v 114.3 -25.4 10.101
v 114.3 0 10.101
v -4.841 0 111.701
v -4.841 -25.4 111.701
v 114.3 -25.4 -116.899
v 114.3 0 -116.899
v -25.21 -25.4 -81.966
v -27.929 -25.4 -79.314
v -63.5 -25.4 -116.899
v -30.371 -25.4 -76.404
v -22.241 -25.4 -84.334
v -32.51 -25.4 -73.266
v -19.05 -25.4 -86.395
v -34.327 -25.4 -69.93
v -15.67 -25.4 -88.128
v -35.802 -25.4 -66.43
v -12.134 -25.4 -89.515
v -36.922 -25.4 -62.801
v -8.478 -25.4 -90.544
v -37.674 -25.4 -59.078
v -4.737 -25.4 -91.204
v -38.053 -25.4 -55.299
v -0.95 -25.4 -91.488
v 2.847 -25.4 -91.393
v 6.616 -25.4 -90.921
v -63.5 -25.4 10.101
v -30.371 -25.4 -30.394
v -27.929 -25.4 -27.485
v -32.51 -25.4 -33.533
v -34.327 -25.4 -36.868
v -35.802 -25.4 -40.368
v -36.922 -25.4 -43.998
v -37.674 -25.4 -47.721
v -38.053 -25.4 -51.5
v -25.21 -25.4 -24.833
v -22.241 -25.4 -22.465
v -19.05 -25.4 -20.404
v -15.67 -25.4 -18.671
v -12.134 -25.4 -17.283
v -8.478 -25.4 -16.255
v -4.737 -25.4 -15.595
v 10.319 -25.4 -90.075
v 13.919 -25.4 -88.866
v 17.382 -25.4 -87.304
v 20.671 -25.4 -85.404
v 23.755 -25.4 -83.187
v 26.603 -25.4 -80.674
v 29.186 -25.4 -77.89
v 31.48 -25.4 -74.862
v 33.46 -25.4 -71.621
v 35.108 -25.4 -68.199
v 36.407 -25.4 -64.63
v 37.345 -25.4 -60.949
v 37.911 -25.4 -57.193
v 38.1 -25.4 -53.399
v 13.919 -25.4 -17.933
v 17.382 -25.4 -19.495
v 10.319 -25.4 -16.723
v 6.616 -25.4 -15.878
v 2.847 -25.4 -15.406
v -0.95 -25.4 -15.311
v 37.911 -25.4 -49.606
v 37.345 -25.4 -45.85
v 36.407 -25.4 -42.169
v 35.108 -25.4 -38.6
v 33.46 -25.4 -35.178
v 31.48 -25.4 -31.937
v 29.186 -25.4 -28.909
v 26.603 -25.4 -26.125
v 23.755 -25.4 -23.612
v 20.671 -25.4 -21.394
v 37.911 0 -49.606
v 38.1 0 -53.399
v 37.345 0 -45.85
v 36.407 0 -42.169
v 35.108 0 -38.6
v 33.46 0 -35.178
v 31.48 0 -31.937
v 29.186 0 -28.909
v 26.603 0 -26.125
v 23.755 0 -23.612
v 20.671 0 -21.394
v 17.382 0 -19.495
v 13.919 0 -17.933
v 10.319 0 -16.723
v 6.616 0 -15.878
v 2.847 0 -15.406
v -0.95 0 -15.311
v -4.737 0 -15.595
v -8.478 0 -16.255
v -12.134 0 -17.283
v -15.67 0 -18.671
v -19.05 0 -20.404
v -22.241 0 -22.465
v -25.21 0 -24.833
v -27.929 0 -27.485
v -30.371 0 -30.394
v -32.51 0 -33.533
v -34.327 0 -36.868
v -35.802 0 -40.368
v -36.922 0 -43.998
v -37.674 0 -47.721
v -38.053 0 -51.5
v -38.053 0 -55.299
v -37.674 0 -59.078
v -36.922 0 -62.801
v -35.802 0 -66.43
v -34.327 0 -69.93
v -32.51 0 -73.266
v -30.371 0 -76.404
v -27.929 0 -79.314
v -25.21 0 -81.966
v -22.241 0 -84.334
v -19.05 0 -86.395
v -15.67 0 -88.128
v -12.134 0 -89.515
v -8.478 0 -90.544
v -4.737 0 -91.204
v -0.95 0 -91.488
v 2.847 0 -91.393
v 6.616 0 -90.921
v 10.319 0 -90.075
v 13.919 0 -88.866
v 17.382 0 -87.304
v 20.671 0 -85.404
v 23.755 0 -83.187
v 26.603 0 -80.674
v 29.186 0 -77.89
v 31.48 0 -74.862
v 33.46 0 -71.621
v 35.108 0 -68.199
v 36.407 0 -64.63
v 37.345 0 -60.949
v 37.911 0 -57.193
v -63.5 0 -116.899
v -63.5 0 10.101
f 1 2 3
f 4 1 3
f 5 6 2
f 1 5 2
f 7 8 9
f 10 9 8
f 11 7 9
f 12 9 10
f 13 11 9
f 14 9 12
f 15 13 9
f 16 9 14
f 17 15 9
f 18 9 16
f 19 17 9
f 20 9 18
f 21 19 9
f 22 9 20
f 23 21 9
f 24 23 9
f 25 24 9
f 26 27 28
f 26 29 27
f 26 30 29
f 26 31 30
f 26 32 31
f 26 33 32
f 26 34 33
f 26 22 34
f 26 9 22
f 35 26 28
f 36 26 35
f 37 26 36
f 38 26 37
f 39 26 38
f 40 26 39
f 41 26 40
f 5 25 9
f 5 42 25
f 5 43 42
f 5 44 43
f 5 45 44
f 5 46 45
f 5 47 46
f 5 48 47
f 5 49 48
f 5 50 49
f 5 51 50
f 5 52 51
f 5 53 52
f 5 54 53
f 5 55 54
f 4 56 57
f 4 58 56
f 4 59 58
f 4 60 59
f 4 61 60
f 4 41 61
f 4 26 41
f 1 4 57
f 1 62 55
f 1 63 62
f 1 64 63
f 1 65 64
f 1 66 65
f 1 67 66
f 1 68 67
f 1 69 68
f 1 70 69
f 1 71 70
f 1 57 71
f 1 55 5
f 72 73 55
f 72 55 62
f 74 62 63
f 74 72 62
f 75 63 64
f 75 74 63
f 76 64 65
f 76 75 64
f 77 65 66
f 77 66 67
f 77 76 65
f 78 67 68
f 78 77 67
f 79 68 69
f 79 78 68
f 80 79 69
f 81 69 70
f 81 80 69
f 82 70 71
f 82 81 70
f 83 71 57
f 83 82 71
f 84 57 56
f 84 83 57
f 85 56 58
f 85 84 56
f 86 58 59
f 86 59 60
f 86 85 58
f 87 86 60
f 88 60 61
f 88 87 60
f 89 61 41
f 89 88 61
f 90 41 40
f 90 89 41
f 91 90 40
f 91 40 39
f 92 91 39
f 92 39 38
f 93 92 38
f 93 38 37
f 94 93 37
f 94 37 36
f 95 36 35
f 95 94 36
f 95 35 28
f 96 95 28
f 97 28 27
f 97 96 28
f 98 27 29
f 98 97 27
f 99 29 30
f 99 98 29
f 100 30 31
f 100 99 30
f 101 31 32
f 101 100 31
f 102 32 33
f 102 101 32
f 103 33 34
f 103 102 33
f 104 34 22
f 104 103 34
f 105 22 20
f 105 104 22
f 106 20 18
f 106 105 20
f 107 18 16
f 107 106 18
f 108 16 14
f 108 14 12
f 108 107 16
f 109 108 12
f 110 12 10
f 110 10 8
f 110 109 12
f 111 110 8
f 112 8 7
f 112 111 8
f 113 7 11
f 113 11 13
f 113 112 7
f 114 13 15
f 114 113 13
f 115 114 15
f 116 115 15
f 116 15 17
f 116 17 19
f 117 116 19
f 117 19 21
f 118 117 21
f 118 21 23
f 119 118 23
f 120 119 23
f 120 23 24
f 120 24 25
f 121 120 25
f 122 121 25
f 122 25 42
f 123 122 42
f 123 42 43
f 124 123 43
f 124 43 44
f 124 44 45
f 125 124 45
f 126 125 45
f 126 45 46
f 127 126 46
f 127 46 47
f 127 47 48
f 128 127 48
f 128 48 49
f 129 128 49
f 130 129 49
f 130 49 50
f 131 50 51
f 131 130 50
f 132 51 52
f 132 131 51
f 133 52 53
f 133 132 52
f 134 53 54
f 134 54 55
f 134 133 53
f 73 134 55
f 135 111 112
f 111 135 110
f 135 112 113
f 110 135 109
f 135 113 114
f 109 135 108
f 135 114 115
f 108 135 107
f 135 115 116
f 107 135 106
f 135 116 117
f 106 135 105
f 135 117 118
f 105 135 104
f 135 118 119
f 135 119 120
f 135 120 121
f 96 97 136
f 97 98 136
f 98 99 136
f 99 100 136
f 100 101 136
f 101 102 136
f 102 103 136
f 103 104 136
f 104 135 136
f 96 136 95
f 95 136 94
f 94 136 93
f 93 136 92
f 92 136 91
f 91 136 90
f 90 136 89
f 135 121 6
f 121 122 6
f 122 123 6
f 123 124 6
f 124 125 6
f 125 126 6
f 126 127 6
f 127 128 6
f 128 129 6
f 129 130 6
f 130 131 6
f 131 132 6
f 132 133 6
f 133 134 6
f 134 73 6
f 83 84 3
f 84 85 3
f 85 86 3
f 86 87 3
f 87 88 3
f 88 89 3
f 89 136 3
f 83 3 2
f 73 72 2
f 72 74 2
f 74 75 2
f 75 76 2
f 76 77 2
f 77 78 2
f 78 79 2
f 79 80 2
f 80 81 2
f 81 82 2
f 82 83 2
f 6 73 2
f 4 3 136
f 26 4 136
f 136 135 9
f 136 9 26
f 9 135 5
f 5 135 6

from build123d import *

# Parameters (mm, degrees)
F0_W     = 177.8
F0_H     = 127
F0_R     = 38.1
F1_DEPTH = 25.4


with BuildPart() as f1:
    # F0 (on Front) → F1 (new body)
    with BuildSketch(Plane.XZ):
        with Locations((25.4, -53.399413)):
            Rectangle(F0_W, F0_H)
        with Locations((0, -53.399413)):
            Circle(F0_R, mode=Mode.SUBTRACT)
        Polygon((-63.5, 10.100587), (114.3, 10.100587), (-4.841213, 111.700587), align=None)
    extrude(amount=F1_DEPTH)


solid = f1.part
